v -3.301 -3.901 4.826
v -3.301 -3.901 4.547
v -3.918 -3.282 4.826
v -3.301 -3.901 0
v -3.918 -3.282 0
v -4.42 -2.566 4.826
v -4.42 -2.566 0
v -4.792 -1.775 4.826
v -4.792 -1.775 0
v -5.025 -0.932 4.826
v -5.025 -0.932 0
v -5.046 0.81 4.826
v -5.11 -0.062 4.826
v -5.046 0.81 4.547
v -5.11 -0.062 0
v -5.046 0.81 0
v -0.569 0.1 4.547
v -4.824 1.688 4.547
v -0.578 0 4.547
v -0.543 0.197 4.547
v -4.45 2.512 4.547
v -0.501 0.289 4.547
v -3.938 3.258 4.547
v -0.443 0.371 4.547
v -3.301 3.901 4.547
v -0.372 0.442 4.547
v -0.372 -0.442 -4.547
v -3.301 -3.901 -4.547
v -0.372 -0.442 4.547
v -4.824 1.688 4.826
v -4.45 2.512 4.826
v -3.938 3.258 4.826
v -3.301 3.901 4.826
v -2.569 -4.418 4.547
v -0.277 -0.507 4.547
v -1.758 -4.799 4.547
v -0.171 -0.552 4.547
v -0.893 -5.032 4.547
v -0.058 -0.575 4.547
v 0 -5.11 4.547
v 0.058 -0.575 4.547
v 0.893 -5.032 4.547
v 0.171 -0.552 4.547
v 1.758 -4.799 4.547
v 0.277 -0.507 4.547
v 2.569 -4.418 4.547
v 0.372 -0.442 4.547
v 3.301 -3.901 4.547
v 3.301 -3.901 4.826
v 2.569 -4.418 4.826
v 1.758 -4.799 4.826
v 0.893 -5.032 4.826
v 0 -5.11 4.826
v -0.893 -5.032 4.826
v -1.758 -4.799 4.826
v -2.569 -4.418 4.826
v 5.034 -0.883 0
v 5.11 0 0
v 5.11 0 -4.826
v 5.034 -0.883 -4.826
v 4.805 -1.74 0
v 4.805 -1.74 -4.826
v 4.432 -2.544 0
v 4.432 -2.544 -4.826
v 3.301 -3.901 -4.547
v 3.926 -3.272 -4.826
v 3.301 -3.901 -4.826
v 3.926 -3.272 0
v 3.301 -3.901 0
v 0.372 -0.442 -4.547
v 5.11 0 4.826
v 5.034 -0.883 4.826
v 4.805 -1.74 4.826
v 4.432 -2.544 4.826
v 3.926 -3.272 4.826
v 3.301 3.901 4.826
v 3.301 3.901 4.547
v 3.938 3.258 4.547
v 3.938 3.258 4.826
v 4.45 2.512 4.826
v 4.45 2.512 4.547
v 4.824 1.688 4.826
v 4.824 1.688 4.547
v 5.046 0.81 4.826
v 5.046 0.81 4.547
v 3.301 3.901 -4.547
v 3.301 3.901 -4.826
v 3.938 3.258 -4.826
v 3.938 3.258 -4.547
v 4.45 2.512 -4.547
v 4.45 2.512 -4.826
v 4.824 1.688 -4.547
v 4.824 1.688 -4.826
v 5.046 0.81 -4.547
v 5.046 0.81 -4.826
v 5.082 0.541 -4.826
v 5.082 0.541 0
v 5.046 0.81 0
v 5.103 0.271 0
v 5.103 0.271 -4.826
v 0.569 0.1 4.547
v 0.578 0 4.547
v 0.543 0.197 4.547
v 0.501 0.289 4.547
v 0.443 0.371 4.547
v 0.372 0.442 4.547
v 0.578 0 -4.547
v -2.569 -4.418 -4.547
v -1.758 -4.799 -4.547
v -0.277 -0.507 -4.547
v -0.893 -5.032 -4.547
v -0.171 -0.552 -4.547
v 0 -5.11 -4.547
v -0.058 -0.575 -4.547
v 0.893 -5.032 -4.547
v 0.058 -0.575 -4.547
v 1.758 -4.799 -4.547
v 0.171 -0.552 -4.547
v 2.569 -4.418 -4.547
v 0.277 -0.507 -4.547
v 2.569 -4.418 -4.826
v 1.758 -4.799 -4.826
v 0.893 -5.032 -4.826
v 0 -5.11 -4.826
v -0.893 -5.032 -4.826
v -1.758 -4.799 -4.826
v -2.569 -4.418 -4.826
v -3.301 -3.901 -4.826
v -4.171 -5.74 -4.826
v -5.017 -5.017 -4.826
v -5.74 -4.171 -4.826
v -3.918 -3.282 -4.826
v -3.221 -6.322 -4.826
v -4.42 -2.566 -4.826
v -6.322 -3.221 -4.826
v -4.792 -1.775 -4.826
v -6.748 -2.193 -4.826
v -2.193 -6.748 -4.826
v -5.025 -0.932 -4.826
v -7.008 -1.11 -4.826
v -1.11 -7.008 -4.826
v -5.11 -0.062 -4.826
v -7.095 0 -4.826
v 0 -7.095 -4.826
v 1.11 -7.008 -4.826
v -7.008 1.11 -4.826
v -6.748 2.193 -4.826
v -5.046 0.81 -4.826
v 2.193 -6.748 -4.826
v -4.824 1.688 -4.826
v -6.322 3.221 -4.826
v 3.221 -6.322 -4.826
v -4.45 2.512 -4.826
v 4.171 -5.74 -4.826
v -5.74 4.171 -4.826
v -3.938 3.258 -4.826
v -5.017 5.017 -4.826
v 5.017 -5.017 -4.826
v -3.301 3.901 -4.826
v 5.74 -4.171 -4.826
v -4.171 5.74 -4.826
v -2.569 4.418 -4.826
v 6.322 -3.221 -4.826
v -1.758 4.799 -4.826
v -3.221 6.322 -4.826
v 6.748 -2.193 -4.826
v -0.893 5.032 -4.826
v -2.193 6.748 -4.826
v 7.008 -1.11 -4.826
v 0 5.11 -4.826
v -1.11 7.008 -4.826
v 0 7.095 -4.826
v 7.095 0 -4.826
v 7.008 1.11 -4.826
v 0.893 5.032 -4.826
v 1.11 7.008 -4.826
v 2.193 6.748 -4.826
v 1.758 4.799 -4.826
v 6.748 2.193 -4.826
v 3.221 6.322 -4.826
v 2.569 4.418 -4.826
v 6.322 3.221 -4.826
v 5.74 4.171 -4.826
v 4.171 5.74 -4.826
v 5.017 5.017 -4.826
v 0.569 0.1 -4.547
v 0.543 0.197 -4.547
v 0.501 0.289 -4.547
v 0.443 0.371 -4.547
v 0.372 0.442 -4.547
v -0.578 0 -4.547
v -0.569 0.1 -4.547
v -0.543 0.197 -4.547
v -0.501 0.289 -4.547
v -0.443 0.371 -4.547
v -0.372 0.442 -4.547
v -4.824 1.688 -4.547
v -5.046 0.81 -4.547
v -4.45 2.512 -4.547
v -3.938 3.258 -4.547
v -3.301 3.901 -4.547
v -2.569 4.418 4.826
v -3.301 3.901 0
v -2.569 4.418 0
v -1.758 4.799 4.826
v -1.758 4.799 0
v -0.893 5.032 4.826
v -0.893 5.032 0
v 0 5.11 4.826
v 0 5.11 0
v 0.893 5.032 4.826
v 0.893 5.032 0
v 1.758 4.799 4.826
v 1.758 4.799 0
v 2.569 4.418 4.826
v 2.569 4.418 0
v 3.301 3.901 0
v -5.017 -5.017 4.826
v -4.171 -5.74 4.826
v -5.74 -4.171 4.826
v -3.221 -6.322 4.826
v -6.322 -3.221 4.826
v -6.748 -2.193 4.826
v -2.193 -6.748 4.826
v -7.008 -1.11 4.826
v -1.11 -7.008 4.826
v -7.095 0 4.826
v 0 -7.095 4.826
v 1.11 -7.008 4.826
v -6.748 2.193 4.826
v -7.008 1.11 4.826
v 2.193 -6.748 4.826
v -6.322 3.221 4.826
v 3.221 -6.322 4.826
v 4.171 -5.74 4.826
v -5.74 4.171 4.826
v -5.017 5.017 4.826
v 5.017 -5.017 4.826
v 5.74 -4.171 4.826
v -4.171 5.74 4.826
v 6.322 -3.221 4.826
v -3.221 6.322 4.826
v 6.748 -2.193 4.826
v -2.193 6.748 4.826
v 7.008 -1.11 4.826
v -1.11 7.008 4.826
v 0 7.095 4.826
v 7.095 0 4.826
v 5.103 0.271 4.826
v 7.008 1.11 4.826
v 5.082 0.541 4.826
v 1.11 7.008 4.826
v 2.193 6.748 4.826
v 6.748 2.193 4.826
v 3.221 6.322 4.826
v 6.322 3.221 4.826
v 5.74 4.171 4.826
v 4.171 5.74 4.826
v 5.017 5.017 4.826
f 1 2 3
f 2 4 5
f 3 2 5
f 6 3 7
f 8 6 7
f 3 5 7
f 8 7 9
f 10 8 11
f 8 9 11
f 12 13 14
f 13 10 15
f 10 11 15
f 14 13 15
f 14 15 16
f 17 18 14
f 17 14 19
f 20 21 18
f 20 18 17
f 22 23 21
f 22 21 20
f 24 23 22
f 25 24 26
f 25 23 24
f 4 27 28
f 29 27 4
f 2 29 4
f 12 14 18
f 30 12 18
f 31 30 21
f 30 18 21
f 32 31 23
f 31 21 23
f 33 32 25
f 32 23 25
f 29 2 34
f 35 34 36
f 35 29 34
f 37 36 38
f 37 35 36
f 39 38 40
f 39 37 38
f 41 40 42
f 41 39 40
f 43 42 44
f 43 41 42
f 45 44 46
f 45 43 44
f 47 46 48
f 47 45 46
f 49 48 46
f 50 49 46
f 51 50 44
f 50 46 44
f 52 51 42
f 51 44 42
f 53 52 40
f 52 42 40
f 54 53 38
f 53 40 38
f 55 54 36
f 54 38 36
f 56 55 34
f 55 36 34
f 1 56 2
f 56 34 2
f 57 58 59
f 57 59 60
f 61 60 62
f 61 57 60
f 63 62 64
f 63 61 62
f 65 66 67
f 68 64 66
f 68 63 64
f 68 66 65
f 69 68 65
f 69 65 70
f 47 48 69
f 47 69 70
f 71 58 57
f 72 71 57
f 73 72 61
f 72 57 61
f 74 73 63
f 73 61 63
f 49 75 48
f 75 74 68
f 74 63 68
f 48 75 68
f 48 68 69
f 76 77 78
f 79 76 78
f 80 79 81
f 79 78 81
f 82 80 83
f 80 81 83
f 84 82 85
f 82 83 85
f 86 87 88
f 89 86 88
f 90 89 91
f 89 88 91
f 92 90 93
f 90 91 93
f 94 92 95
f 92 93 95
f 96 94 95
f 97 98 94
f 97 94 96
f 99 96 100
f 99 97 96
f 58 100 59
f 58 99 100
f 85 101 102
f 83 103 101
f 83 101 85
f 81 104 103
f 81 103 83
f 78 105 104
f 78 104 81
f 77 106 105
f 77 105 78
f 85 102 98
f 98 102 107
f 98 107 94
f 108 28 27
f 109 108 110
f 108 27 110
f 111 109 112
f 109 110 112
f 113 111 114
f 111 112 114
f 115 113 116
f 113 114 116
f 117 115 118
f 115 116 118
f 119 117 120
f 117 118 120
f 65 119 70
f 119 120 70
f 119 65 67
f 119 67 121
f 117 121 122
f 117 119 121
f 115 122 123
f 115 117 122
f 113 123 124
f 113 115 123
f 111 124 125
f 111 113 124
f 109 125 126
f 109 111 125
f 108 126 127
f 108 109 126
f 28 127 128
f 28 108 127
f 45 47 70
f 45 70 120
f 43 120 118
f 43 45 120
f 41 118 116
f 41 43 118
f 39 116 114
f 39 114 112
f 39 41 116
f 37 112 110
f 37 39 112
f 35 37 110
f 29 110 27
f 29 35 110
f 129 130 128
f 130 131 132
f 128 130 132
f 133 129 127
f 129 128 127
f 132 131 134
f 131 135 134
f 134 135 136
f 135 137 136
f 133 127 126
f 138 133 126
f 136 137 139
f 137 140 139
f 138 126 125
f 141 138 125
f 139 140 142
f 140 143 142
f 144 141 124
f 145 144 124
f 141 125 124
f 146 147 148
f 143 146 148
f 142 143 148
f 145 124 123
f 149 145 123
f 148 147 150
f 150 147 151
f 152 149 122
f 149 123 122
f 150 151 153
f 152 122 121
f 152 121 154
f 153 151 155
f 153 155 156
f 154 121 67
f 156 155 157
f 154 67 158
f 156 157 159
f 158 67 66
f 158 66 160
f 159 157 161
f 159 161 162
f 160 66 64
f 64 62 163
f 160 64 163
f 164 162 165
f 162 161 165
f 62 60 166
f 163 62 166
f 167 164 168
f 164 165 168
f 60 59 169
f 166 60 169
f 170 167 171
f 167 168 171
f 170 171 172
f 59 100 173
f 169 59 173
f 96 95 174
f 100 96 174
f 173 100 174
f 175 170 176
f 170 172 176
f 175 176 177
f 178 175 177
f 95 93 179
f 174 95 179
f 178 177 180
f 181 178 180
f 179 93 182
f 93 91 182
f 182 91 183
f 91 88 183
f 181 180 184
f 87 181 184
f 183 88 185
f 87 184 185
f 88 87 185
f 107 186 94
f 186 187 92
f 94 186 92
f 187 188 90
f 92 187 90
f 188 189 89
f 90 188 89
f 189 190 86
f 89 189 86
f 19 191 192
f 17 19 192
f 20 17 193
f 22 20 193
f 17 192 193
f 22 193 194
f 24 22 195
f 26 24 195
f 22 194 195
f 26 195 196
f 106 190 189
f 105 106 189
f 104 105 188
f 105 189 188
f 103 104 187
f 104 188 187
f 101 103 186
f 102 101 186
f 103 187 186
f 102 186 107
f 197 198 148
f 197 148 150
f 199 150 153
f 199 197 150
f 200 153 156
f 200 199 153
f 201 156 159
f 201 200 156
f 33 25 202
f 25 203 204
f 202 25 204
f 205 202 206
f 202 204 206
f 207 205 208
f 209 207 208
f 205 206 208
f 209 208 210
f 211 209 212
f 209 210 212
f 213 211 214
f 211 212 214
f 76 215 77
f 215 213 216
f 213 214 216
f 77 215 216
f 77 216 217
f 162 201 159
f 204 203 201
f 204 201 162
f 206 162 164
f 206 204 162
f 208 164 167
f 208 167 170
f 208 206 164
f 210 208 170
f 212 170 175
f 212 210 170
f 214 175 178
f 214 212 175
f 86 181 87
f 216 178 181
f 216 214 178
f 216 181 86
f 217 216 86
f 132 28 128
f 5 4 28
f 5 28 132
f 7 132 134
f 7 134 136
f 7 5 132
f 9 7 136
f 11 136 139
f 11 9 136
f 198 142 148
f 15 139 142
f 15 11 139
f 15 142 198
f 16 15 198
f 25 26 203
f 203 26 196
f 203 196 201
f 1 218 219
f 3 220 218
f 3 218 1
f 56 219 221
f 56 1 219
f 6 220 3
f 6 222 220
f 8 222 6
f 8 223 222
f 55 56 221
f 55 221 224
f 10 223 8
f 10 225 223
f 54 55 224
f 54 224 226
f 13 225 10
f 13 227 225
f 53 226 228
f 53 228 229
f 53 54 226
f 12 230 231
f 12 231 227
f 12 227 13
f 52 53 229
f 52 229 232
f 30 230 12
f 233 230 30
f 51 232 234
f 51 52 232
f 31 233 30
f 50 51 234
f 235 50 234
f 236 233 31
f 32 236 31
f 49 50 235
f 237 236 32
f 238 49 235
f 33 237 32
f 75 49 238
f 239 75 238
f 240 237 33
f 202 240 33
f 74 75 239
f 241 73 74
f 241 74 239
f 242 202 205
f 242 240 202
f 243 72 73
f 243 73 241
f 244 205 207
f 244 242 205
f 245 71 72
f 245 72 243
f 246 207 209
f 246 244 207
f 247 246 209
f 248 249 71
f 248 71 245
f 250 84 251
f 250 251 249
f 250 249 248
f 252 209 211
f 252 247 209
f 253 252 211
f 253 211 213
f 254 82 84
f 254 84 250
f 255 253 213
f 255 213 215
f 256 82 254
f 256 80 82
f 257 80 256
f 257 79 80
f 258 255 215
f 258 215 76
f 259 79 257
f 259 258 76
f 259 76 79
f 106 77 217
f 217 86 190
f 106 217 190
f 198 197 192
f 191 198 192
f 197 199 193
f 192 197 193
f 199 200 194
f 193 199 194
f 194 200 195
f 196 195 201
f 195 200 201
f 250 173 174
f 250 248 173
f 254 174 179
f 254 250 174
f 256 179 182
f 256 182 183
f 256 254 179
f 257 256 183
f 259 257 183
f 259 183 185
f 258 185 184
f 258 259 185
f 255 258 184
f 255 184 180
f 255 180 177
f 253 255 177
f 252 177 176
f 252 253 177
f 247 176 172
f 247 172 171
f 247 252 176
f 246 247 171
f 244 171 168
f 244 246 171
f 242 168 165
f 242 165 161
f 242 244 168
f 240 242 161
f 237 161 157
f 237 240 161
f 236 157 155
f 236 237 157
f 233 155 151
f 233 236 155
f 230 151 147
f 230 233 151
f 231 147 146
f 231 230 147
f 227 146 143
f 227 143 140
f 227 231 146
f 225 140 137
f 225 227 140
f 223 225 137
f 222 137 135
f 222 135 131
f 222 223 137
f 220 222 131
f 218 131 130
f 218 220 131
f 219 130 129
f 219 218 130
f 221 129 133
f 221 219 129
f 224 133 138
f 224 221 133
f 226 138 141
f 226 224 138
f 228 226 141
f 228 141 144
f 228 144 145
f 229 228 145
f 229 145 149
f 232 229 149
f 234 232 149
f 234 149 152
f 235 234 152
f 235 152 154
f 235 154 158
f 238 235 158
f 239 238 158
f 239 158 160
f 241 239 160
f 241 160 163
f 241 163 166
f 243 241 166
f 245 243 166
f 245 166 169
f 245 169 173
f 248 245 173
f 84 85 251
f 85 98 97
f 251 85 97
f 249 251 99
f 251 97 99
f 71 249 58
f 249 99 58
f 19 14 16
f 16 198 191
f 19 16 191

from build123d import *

# Parameters (mm, degrees)
F0_R     = 7.0954565199
F1_DEPTH = 4.826
F2_DEPTH = 4.5466


# Not quite as in the source:
# - the program builds the solid bodies; features that only make, move or delete a surface that nothing else refers to are left out


with BuildPart() as f1:
    # F0 (on Top) → F1 (new body, symmetric)
    with BuildSketch(Plane.XY):
        Circle(F0_R)
        with BuildLine():
            ThreePointArc((3.3010527039, 3.9012801832), (4.4504568739, 2.5120449112), (5.045856518, 0.8101037104))
            ThreePointArc((5.045856518, 0.8101037104), (5.0942933944, 0.4063383238), (5.1104731701, 0))
            ThreePointArc((5.1104731701, 0), (4.6361016651, -2.1502319347), (3.3010527039, -3.9012801832))
            ThreePointArc((3.3010527039, -3.9012801832), (0, -5.1104731701), (-3.3010527039, -3.9012801832))
            ThreePointArc((-3.3010527039, -3.9012801832), (-4.7923906287, -1.7748036747), (-5.045856518, 0.8101037104))
            ThreePointArc((-5.045856518, 0.8101037104), (-4.4504568739, 2.5120449112), (-3.3010527039, 3.9012801832))
            ThreePointArc((-3.3010527039, 3.9012801832), (0, 5.1104731701), (3.3010527039, 3.9012801832))
        make_face(mode=Mode.SUBTRACT)
    extrude(amount=F1_DEPTH, both=True)

    # F0 (on Top) → F2 (join, symmetric)
    with BuildSketch(Plane.XY):
        with BuildLine():
            ThreePointArc((0.3718910489, 0.4422755592), (0.5238357878, 0.243939931), (0.57785, 0))
            Line((0.57785, 0), (5.045856518, 0.8101037104))
            ThreePointArc((5.045856518, 0.8101037104), (4.4504568739, 2.5120449112), (3.3010527039, 3.9012801832))
            Line((3.3010527039, 3.9012801832), (0.3718910489, 0.4422755592))
        make_face()
        with BuildLine():
            ThreePointArc((-0.57785, 0), (-0.5238357878, 0.243939931), (-0.3718910489, 0.4422755592))
            Line((-0.3718910489, 0.4422755592), (-3.3010527039, 3.9012801832))
            ThreePointArc((-3.3010527039, 3.9012801832), (-4.4504568739, 2.5120449112), (-5.045856518, 0.8101037104))
            Line((-5.045856518, 0.8101037104), (-0.57785, 0))
        make_face()
        with BuildLine():
            Line((3.3010527039, -3.9012801832), (0.3718910489, -0.4422755592))
            ThreePointArc((0.3718910489, -0.4422755592), (0, -0.57785), (-0.3718910489, -0.4422755592))
            Line((-0.3718910489, -0.4422755592), (-3.3010527039, -3.9012801832))
            ThreePointArc((-3.3010527039, -3.9012801832), (0, -5.1104731701), (3.3010527039, -3.9012801832))
        make_face()
    extrude(amount=F2_DEPTH, both=True)


solid = f1.part
